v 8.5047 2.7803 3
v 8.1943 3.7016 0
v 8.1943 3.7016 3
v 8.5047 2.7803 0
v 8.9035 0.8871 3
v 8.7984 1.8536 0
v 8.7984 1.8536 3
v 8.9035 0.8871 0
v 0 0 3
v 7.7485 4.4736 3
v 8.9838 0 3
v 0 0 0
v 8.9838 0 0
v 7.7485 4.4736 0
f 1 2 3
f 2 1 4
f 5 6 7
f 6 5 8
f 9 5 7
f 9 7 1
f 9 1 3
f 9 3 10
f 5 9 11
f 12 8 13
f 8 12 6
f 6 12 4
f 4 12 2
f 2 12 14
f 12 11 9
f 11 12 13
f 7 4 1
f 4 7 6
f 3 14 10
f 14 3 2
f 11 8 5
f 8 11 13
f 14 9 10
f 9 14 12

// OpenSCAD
toleranta=1;//toleranta la desenare

//______________cu diferenta
module felie_pizza_diference(diametru,grosime,unghi_felie)
{
    
    difference(){
        cylinder(h=grosime,r=diametru/2);
        translate([-diametru/2-toleranta,-diametru/2-toleranta,-toleranta])     cube([diametru+2*toleranta, diametru/2+toleranta,grosime+2*toleranta        ]);       
        rotate([0,0,30]) translate([-diametru/2-toleranta,0,-toleranta]) cube([     diametru+2*toleranta, diametru/2+toleranta,grosime+2*toleranta]);   
    }
}    
//enn______________cu diferenta   
module felie_pizza_intersection(diametru,grosime,unghi_felie)
{
    
    intersection(){
        cylinder(h=grosime,r=diametru/2);
        translate([-diametru/2-toleranta,0,-toleranta]) cube([diametru+2*toleranta, diametru/2+toleranta,grosime+2*toleranta]);  
        rotate([0,0,-(90-unghi_felie)]) cube([diametru/2+toleranta, diametru/2+toleranta,grosime+2*toleranta]);      
        
        }
    }
        
 module felie_pizza_intersection_1(diametru,grosime,unghi_felie)
{
    intersection()//intersectie de 2 intersectii
    {
            intersection()//intersectie 1
        {
            cylinder(h=grosime,r=diametru/2);
            translate([-diametru/2-toleranta,0,-toleranta]) cube([diametru+2*           toleranta, diametru/2+toleranta,grosime+2*toleranta]);  
        }
        
    rotate([0,0,-(180-unghi_felie)])  intersection()//intersectie2 rotita 150
        { 
            cylinder(h=grosime,r=diametru/2);
            translate([-diametru/2-toleranta,0,-toleranta]) cube([diametru+2*       toleranta, diametru/2+toleranta,grosime+2*toleranta]);  
        }
       
    }      
}  
//felie_pizza_diference(diametru=30,grosime=3,unghi_felie=30);
//felie_pizza_intersection(diametru=18,grosime=3,unghi_felie=30);  
felie_pizza_intersection_1(diametru=18,grosime=3,unghi_felie=30); 
